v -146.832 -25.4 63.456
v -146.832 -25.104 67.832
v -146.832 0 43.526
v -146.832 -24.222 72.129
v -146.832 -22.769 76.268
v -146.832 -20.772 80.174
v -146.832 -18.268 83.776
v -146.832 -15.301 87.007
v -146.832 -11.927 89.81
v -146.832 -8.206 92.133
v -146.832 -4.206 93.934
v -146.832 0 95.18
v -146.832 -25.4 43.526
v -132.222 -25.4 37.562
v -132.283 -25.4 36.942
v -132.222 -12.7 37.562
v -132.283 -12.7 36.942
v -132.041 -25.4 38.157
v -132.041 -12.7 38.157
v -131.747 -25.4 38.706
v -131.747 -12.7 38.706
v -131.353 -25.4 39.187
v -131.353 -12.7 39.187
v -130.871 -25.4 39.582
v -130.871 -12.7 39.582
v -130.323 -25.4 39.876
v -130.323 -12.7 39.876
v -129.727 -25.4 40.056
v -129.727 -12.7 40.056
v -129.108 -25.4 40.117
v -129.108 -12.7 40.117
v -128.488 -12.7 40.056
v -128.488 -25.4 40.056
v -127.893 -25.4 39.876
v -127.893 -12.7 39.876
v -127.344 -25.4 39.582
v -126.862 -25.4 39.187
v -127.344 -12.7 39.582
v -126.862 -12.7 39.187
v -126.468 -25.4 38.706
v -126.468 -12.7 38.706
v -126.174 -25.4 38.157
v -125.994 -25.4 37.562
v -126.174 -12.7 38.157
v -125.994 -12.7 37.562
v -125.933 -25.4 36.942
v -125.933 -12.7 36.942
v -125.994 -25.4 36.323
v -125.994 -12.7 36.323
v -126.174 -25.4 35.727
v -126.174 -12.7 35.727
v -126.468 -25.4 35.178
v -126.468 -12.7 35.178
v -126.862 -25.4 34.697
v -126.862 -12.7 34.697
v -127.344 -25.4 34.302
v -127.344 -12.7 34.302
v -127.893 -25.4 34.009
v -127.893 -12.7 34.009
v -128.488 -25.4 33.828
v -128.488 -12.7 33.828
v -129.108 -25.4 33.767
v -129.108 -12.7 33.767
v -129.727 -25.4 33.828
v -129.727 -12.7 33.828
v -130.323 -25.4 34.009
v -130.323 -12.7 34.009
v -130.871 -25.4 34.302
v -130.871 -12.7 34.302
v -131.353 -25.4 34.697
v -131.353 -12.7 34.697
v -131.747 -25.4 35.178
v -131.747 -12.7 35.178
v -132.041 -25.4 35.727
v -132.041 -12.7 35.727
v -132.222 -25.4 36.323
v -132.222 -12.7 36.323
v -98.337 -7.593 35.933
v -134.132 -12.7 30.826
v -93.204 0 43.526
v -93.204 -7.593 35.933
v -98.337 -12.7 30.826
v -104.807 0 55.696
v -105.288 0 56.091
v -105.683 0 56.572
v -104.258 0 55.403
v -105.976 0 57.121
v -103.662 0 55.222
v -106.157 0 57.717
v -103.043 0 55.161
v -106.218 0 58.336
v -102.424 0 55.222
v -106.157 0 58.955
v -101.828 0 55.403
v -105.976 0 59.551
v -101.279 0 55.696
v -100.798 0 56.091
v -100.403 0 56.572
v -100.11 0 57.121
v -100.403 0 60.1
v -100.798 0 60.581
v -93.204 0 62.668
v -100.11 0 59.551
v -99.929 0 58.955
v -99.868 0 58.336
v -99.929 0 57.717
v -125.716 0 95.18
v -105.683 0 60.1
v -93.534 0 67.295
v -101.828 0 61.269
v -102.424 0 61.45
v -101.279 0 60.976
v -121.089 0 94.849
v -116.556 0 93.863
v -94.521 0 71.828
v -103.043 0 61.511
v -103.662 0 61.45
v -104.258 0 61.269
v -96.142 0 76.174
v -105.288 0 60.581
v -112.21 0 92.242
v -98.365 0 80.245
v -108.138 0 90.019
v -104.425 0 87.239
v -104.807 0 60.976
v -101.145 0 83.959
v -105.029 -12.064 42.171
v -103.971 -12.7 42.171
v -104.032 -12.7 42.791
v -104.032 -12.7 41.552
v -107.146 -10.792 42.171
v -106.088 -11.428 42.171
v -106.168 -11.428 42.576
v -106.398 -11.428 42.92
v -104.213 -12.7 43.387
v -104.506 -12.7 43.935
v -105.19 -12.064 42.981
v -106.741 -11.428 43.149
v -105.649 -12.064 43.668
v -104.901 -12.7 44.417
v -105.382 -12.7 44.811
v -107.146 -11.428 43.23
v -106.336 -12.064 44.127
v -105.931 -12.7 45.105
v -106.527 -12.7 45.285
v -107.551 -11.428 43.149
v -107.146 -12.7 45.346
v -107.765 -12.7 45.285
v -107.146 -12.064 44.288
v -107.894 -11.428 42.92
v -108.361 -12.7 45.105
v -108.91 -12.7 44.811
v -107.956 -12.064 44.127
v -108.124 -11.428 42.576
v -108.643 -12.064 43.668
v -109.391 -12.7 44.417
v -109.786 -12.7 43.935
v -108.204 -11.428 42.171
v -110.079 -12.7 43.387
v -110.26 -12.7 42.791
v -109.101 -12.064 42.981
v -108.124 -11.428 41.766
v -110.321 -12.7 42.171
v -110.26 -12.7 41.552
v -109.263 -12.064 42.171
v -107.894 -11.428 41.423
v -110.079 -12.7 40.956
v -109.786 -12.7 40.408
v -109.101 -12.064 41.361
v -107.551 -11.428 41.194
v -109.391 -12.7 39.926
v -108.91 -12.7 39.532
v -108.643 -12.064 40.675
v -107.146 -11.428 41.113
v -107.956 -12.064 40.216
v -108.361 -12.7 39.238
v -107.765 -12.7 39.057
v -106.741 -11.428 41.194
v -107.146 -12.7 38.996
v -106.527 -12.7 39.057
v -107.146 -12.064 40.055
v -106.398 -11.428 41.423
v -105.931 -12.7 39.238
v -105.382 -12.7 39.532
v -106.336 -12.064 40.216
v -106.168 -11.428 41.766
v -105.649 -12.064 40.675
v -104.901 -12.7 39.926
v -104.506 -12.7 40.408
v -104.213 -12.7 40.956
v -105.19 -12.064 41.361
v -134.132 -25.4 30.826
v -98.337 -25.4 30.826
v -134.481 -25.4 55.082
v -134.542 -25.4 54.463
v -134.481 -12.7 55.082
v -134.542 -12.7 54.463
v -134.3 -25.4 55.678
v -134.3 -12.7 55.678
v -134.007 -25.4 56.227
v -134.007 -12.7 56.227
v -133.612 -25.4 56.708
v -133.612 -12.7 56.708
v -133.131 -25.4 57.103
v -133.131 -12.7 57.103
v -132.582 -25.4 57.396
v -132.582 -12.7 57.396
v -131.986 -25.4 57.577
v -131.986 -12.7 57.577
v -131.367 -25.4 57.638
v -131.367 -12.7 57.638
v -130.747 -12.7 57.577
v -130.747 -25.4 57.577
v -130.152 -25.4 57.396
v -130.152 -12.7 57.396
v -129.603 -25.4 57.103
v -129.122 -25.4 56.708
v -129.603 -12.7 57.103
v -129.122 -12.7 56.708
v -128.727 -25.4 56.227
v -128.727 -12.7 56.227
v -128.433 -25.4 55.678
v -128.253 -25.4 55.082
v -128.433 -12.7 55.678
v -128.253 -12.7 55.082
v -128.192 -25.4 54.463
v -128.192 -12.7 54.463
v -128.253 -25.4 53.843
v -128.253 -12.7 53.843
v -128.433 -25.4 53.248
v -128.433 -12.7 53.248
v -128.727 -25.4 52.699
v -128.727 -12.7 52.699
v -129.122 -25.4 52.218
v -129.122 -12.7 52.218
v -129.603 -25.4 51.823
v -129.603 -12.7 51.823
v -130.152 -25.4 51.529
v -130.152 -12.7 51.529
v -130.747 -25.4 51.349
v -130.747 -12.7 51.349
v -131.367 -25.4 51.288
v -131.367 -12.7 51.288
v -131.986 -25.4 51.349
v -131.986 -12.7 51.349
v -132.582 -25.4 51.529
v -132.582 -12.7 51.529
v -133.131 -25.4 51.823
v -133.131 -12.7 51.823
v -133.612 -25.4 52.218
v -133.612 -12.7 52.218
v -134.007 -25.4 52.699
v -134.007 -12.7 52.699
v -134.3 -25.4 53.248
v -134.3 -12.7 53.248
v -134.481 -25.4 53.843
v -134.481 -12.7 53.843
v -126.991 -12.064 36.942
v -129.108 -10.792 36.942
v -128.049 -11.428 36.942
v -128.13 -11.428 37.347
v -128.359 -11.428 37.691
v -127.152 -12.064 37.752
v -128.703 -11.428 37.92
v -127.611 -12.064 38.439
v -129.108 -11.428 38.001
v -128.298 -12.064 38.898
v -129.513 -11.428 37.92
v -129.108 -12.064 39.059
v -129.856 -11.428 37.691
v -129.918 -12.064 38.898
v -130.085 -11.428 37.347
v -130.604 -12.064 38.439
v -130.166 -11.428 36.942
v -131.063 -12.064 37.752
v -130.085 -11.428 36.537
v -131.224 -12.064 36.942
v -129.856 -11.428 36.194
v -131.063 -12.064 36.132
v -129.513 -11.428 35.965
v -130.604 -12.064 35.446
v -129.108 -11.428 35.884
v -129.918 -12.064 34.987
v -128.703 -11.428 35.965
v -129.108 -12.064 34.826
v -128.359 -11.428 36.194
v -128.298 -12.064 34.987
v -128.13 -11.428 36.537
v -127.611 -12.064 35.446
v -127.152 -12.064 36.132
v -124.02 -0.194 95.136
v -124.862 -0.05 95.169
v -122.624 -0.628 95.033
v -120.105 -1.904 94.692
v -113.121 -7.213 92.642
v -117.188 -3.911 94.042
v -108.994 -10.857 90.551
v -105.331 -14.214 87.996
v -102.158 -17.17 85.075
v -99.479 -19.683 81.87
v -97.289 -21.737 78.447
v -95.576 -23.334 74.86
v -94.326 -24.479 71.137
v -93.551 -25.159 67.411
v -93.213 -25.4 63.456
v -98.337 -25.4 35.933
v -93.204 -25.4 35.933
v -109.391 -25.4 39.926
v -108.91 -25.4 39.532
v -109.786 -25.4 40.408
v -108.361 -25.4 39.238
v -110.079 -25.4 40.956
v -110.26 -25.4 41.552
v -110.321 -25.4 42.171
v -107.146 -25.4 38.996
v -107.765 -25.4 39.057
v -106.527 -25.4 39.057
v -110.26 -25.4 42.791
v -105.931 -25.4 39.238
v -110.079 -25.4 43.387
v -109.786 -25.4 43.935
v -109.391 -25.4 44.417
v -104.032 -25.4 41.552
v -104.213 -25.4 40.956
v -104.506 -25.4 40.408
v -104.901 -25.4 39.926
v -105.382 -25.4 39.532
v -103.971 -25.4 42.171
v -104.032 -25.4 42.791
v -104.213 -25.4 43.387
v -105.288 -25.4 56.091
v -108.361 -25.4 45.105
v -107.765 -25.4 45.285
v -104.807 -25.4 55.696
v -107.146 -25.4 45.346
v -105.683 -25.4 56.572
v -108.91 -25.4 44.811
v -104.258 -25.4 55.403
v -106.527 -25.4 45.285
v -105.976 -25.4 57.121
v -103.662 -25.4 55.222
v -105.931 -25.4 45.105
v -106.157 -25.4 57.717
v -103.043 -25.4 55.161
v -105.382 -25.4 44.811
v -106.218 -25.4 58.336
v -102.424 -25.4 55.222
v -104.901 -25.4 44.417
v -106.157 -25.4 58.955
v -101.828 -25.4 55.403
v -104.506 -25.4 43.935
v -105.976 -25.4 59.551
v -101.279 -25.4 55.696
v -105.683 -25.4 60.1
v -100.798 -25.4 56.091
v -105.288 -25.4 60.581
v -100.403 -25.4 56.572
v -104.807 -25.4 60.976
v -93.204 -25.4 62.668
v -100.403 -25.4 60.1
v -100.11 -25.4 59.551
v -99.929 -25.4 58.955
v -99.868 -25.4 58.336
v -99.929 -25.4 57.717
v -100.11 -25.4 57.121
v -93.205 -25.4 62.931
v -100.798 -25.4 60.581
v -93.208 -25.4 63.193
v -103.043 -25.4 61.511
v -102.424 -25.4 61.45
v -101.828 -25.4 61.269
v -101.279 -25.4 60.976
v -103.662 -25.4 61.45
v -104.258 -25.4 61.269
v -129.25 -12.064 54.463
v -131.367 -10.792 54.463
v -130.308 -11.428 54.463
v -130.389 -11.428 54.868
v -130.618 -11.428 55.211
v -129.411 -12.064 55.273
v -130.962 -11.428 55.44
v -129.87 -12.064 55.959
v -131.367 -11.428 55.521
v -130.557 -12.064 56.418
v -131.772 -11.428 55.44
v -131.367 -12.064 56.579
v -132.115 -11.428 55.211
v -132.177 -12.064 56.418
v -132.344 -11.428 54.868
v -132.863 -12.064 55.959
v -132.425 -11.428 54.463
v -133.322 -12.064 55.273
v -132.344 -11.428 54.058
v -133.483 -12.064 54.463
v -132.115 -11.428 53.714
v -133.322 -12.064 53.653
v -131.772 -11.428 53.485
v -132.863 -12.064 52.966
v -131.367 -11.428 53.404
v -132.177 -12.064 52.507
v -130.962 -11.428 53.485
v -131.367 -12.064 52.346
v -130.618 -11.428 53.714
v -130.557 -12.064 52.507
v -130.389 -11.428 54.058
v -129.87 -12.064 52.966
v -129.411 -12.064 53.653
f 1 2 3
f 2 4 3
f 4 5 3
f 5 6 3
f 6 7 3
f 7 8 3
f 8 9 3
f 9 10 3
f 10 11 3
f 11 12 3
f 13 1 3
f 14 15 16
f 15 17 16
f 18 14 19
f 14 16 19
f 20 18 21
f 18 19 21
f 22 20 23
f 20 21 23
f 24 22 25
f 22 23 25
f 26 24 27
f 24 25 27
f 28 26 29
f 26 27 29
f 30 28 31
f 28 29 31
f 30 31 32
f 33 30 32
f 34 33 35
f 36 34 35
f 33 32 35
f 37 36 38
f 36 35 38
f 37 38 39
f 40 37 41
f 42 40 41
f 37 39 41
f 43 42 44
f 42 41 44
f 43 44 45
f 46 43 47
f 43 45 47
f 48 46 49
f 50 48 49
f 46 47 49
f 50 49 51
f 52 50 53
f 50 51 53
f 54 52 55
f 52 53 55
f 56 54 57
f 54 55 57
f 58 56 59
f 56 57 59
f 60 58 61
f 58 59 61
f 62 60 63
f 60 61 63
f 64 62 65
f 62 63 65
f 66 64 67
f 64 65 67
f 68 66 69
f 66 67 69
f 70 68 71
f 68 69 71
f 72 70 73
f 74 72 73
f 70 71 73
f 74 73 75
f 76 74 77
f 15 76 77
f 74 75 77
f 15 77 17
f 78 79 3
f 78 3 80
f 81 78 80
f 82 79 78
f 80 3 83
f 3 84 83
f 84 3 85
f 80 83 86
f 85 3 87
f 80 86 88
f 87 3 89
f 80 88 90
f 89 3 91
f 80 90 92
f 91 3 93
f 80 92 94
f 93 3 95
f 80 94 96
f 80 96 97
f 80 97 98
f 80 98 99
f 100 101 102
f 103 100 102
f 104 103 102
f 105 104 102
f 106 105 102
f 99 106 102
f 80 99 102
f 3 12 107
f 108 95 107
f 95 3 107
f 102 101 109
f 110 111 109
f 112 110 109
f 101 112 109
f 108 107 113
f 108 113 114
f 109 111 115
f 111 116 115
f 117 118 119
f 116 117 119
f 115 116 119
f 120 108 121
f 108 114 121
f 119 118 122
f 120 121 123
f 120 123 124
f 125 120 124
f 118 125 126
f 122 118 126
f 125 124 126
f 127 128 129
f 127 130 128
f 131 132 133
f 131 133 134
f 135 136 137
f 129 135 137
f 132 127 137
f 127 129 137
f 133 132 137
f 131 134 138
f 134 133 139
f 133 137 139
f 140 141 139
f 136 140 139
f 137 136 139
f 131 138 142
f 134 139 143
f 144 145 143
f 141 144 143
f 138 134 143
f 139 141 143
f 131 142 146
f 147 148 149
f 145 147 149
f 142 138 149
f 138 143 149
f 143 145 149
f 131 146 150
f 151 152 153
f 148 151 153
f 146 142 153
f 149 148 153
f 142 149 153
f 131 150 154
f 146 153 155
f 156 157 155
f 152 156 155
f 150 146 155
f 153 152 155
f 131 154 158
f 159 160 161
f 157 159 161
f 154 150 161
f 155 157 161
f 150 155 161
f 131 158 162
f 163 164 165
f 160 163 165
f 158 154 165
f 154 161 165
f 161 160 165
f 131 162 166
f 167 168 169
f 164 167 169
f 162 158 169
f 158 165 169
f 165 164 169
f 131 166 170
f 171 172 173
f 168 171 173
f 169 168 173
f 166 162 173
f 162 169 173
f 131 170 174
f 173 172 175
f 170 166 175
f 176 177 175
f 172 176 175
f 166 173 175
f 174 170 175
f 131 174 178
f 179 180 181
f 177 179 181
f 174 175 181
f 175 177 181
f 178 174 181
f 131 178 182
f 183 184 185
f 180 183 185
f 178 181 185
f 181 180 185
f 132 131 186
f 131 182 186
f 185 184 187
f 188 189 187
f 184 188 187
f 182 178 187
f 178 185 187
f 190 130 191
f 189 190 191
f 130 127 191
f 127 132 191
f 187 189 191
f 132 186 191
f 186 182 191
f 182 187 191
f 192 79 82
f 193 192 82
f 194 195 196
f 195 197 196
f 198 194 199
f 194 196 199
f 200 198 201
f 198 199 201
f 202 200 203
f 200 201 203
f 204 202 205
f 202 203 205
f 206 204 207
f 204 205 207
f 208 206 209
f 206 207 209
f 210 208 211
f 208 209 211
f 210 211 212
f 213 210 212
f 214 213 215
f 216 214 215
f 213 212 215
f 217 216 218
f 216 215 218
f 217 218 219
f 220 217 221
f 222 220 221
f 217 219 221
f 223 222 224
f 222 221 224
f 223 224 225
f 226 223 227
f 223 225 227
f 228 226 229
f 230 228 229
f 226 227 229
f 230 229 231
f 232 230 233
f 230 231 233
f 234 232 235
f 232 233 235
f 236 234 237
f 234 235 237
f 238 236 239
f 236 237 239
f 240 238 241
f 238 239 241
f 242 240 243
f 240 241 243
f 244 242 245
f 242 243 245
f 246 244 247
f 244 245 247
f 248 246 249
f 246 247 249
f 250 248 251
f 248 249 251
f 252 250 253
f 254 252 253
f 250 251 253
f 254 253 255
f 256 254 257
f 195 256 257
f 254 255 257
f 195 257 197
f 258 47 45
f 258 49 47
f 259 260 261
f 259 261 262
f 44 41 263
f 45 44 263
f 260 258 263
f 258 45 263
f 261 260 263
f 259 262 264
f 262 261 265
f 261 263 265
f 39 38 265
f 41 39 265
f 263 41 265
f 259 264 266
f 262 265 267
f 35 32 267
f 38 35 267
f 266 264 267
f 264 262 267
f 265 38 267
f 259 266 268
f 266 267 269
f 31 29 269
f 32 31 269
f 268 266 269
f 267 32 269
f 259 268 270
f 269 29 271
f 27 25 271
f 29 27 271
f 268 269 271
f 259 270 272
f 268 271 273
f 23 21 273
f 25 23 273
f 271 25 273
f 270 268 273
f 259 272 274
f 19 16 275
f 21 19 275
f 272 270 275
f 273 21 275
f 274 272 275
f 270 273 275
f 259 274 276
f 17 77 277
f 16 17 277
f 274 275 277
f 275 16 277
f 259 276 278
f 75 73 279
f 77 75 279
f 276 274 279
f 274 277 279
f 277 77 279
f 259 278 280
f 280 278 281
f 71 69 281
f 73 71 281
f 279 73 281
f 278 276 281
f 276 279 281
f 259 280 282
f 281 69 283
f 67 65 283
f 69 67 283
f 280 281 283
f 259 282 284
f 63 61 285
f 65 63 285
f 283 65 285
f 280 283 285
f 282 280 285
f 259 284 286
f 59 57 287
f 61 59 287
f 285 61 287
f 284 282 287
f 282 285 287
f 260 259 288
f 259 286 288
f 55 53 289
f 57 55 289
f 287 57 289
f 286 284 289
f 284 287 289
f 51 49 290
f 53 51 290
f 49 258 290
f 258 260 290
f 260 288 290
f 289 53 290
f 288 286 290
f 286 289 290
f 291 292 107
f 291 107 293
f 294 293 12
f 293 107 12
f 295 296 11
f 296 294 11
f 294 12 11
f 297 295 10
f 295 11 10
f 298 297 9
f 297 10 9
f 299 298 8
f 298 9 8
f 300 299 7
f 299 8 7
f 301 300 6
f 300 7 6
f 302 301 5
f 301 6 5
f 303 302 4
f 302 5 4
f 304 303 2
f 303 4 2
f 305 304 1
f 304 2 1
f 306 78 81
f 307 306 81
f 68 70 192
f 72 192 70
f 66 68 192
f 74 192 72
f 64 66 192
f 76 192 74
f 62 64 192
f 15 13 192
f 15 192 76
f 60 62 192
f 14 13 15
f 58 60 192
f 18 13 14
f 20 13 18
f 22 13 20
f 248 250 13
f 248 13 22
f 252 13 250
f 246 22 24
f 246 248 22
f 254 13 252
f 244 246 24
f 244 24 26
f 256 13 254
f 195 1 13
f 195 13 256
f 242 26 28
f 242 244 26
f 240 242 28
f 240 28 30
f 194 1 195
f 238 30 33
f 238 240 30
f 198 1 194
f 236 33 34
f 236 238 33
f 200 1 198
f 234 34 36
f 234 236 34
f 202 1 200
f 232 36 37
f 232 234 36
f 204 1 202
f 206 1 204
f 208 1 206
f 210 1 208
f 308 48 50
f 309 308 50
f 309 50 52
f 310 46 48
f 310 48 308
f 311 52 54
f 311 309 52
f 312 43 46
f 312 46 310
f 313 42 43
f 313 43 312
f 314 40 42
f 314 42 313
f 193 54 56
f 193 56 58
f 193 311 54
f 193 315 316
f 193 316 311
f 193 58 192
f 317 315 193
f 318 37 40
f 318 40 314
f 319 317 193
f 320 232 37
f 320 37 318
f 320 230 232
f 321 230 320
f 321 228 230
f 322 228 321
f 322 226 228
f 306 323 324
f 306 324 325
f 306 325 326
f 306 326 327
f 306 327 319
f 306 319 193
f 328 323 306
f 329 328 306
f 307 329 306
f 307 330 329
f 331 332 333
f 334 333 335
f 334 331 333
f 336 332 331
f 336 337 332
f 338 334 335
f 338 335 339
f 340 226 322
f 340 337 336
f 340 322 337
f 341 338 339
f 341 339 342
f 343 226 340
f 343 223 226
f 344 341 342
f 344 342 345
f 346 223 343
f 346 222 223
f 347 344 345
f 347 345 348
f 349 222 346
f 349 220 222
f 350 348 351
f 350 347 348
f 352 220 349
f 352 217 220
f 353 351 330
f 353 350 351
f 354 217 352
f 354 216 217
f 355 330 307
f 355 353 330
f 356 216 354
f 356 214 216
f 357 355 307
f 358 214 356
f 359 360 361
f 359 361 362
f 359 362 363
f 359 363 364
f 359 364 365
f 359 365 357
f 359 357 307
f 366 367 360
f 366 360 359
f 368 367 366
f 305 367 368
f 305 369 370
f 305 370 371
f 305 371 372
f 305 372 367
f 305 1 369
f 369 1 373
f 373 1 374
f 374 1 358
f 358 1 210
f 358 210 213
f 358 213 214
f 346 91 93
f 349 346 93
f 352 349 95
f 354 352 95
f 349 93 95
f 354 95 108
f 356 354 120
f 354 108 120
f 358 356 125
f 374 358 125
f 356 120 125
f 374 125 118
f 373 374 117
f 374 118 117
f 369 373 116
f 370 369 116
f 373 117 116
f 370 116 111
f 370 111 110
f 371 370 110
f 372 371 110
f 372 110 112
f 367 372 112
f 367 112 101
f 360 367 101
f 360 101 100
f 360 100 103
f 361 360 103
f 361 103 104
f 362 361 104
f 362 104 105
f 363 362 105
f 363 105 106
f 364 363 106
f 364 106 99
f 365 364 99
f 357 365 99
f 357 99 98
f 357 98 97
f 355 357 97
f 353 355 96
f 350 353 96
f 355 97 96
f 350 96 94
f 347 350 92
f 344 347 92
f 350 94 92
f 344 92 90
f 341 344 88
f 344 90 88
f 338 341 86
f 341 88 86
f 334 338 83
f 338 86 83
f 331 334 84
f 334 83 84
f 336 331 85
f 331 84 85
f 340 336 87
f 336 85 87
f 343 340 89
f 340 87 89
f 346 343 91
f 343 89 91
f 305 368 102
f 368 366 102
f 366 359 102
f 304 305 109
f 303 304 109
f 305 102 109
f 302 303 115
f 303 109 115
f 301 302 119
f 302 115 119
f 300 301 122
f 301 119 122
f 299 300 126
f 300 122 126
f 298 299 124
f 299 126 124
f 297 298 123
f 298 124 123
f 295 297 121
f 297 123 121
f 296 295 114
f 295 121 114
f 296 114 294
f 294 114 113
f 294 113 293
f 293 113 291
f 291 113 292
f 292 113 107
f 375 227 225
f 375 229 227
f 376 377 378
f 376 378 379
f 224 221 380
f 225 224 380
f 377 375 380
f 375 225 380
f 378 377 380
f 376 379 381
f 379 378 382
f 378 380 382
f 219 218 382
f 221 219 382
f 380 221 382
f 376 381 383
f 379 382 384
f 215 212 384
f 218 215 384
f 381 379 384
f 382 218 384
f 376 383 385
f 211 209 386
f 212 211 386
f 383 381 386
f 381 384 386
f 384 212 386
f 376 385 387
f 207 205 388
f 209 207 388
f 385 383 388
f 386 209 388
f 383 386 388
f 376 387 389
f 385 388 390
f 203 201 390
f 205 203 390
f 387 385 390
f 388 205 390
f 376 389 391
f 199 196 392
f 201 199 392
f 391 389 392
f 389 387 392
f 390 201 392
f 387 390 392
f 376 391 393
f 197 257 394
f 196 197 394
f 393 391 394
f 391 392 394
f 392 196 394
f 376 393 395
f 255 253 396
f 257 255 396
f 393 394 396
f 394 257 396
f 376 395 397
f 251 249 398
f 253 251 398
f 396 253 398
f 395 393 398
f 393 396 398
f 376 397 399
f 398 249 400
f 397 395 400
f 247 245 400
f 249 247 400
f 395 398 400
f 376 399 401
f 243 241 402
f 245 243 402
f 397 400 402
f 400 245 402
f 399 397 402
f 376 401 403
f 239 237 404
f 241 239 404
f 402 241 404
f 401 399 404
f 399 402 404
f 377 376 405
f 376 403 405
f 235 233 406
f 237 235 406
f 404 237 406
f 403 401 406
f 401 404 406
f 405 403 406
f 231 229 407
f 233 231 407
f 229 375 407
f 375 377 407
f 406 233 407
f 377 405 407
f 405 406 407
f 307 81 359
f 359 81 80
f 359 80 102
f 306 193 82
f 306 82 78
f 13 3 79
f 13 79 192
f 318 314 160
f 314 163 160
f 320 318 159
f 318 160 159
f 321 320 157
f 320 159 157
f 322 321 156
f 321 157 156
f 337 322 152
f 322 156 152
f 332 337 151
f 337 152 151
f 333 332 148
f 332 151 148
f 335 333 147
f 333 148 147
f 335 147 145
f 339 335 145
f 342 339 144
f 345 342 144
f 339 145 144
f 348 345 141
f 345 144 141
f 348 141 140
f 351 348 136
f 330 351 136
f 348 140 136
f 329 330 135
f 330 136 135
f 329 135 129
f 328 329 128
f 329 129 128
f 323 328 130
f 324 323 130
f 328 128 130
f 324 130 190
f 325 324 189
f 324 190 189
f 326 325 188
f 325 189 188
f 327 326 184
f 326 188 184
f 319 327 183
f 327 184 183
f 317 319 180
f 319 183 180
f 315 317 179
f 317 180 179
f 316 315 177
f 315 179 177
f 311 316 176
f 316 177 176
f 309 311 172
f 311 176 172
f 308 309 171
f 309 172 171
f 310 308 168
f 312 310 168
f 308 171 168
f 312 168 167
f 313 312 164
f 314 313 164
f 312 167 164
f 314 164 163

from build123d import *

# Parameters (mm, degrees)
F1_DEPTH    = 25.4
F2_T1_DEPTH = 187.96
F2_T3_DEPTH = 212.2513193251
F3_SIZE     = 12.7
F5_D        = 6.35
F6_D        = 6.35
F6_DEPTH    = 12.7
F6_TIP      = 1.9077324654


# Not quite as in the source:
# - a fillet or chamfer that OpenCascade refuses, or shapes differently, is made with other operations: its cross-section is extruded or revolved along the edge and cut away or added


with BuildPart() as f1:
    # F0 (on Front) → F1 (new body)
    with BuildSketch(Plane.XZ):
        Polygon((-98.3372926712, 35.933367908), (-93.2035595179, 35.933367908), (-93.2035595179, 95.180105418), (-146.8319296837, 95.180105418), (-146.8319296837, 30.8260507882), (-98.3372926712, 30.8260507882), align=None)
    extrude(amount=F1_DEPTH)

    # F2: fillet of radius 32.512 on 2 edges, made by hand

    # F2_s2 → F2_t1 (cut)
    with BuildSketch(Plane.XZ.offset(-81.28)):
        with BuildLine():
            ThreePointArc((-93.2035595179, 62.668105418), (-102.7261038479, 85.6575610879), (-125.7155595179, 95.180105418))
            Line((-125.7155595179, 95.180105418), (-93.2035595179, 95.180105418))
            Line((-93.2035595179, 95.180105418), (-93.2035595179, 62.668105418))
        make_face()
    extrude(amount=F2_T1_DEPTH, mode=Mode.SUBTRACT)

    # F2_s4 → F2_t3 (cut)
    with BuildSketch(Plane.YZ.offset(-226.1434042633)):
        with BuildLine():
            ThreePointArc((0, 95.180105418), (-18.2676718655, 83.7755155861), (-25.4, 63.4555155861))
            Line((-25.4, 63.4555155861), (-25.4, 95.180105418))
            Line((-25.4, 95.180105418), (0, 95.180105418))
        make_face()
    extrude(amount=F2_T3_DEPTH, mode=Mode.SUBTRACT)

    # F3
    f3_edges = [f1.edges().sort_by_distance(p)[0] for p in [
        (-122.584611, 0, 30.826051),
        (-146.83193, -12.7, 30.826051),
    ]]
    chamfer(f3_edges, length=F3_SIZE)

    # F5 (through all)
    with Locations(Plane.XZ.offset(25.4)):
        with Locations((-103.0430421233, 58.3359822631)):
            Hole(F5_D / 2)

    # F6
    with Locations(Plane.XZ.offset(25.4)):
        with Locations((-131.3667148352, 54.4626787305), (-107.1459278464, 42.1714857221), (-129.1075199842, 36.9423851371)):
            Hole(F6_D / 2, depth=F6_DEPTH)
            with Locations((0, 0, -(F6_DEPTH + F6_TIP / 2))):  # 118° drill point
                Cone(0, F6_D / 2, F6_TIP, mode=Mode.SUBTRACT)


solid = f1.part
